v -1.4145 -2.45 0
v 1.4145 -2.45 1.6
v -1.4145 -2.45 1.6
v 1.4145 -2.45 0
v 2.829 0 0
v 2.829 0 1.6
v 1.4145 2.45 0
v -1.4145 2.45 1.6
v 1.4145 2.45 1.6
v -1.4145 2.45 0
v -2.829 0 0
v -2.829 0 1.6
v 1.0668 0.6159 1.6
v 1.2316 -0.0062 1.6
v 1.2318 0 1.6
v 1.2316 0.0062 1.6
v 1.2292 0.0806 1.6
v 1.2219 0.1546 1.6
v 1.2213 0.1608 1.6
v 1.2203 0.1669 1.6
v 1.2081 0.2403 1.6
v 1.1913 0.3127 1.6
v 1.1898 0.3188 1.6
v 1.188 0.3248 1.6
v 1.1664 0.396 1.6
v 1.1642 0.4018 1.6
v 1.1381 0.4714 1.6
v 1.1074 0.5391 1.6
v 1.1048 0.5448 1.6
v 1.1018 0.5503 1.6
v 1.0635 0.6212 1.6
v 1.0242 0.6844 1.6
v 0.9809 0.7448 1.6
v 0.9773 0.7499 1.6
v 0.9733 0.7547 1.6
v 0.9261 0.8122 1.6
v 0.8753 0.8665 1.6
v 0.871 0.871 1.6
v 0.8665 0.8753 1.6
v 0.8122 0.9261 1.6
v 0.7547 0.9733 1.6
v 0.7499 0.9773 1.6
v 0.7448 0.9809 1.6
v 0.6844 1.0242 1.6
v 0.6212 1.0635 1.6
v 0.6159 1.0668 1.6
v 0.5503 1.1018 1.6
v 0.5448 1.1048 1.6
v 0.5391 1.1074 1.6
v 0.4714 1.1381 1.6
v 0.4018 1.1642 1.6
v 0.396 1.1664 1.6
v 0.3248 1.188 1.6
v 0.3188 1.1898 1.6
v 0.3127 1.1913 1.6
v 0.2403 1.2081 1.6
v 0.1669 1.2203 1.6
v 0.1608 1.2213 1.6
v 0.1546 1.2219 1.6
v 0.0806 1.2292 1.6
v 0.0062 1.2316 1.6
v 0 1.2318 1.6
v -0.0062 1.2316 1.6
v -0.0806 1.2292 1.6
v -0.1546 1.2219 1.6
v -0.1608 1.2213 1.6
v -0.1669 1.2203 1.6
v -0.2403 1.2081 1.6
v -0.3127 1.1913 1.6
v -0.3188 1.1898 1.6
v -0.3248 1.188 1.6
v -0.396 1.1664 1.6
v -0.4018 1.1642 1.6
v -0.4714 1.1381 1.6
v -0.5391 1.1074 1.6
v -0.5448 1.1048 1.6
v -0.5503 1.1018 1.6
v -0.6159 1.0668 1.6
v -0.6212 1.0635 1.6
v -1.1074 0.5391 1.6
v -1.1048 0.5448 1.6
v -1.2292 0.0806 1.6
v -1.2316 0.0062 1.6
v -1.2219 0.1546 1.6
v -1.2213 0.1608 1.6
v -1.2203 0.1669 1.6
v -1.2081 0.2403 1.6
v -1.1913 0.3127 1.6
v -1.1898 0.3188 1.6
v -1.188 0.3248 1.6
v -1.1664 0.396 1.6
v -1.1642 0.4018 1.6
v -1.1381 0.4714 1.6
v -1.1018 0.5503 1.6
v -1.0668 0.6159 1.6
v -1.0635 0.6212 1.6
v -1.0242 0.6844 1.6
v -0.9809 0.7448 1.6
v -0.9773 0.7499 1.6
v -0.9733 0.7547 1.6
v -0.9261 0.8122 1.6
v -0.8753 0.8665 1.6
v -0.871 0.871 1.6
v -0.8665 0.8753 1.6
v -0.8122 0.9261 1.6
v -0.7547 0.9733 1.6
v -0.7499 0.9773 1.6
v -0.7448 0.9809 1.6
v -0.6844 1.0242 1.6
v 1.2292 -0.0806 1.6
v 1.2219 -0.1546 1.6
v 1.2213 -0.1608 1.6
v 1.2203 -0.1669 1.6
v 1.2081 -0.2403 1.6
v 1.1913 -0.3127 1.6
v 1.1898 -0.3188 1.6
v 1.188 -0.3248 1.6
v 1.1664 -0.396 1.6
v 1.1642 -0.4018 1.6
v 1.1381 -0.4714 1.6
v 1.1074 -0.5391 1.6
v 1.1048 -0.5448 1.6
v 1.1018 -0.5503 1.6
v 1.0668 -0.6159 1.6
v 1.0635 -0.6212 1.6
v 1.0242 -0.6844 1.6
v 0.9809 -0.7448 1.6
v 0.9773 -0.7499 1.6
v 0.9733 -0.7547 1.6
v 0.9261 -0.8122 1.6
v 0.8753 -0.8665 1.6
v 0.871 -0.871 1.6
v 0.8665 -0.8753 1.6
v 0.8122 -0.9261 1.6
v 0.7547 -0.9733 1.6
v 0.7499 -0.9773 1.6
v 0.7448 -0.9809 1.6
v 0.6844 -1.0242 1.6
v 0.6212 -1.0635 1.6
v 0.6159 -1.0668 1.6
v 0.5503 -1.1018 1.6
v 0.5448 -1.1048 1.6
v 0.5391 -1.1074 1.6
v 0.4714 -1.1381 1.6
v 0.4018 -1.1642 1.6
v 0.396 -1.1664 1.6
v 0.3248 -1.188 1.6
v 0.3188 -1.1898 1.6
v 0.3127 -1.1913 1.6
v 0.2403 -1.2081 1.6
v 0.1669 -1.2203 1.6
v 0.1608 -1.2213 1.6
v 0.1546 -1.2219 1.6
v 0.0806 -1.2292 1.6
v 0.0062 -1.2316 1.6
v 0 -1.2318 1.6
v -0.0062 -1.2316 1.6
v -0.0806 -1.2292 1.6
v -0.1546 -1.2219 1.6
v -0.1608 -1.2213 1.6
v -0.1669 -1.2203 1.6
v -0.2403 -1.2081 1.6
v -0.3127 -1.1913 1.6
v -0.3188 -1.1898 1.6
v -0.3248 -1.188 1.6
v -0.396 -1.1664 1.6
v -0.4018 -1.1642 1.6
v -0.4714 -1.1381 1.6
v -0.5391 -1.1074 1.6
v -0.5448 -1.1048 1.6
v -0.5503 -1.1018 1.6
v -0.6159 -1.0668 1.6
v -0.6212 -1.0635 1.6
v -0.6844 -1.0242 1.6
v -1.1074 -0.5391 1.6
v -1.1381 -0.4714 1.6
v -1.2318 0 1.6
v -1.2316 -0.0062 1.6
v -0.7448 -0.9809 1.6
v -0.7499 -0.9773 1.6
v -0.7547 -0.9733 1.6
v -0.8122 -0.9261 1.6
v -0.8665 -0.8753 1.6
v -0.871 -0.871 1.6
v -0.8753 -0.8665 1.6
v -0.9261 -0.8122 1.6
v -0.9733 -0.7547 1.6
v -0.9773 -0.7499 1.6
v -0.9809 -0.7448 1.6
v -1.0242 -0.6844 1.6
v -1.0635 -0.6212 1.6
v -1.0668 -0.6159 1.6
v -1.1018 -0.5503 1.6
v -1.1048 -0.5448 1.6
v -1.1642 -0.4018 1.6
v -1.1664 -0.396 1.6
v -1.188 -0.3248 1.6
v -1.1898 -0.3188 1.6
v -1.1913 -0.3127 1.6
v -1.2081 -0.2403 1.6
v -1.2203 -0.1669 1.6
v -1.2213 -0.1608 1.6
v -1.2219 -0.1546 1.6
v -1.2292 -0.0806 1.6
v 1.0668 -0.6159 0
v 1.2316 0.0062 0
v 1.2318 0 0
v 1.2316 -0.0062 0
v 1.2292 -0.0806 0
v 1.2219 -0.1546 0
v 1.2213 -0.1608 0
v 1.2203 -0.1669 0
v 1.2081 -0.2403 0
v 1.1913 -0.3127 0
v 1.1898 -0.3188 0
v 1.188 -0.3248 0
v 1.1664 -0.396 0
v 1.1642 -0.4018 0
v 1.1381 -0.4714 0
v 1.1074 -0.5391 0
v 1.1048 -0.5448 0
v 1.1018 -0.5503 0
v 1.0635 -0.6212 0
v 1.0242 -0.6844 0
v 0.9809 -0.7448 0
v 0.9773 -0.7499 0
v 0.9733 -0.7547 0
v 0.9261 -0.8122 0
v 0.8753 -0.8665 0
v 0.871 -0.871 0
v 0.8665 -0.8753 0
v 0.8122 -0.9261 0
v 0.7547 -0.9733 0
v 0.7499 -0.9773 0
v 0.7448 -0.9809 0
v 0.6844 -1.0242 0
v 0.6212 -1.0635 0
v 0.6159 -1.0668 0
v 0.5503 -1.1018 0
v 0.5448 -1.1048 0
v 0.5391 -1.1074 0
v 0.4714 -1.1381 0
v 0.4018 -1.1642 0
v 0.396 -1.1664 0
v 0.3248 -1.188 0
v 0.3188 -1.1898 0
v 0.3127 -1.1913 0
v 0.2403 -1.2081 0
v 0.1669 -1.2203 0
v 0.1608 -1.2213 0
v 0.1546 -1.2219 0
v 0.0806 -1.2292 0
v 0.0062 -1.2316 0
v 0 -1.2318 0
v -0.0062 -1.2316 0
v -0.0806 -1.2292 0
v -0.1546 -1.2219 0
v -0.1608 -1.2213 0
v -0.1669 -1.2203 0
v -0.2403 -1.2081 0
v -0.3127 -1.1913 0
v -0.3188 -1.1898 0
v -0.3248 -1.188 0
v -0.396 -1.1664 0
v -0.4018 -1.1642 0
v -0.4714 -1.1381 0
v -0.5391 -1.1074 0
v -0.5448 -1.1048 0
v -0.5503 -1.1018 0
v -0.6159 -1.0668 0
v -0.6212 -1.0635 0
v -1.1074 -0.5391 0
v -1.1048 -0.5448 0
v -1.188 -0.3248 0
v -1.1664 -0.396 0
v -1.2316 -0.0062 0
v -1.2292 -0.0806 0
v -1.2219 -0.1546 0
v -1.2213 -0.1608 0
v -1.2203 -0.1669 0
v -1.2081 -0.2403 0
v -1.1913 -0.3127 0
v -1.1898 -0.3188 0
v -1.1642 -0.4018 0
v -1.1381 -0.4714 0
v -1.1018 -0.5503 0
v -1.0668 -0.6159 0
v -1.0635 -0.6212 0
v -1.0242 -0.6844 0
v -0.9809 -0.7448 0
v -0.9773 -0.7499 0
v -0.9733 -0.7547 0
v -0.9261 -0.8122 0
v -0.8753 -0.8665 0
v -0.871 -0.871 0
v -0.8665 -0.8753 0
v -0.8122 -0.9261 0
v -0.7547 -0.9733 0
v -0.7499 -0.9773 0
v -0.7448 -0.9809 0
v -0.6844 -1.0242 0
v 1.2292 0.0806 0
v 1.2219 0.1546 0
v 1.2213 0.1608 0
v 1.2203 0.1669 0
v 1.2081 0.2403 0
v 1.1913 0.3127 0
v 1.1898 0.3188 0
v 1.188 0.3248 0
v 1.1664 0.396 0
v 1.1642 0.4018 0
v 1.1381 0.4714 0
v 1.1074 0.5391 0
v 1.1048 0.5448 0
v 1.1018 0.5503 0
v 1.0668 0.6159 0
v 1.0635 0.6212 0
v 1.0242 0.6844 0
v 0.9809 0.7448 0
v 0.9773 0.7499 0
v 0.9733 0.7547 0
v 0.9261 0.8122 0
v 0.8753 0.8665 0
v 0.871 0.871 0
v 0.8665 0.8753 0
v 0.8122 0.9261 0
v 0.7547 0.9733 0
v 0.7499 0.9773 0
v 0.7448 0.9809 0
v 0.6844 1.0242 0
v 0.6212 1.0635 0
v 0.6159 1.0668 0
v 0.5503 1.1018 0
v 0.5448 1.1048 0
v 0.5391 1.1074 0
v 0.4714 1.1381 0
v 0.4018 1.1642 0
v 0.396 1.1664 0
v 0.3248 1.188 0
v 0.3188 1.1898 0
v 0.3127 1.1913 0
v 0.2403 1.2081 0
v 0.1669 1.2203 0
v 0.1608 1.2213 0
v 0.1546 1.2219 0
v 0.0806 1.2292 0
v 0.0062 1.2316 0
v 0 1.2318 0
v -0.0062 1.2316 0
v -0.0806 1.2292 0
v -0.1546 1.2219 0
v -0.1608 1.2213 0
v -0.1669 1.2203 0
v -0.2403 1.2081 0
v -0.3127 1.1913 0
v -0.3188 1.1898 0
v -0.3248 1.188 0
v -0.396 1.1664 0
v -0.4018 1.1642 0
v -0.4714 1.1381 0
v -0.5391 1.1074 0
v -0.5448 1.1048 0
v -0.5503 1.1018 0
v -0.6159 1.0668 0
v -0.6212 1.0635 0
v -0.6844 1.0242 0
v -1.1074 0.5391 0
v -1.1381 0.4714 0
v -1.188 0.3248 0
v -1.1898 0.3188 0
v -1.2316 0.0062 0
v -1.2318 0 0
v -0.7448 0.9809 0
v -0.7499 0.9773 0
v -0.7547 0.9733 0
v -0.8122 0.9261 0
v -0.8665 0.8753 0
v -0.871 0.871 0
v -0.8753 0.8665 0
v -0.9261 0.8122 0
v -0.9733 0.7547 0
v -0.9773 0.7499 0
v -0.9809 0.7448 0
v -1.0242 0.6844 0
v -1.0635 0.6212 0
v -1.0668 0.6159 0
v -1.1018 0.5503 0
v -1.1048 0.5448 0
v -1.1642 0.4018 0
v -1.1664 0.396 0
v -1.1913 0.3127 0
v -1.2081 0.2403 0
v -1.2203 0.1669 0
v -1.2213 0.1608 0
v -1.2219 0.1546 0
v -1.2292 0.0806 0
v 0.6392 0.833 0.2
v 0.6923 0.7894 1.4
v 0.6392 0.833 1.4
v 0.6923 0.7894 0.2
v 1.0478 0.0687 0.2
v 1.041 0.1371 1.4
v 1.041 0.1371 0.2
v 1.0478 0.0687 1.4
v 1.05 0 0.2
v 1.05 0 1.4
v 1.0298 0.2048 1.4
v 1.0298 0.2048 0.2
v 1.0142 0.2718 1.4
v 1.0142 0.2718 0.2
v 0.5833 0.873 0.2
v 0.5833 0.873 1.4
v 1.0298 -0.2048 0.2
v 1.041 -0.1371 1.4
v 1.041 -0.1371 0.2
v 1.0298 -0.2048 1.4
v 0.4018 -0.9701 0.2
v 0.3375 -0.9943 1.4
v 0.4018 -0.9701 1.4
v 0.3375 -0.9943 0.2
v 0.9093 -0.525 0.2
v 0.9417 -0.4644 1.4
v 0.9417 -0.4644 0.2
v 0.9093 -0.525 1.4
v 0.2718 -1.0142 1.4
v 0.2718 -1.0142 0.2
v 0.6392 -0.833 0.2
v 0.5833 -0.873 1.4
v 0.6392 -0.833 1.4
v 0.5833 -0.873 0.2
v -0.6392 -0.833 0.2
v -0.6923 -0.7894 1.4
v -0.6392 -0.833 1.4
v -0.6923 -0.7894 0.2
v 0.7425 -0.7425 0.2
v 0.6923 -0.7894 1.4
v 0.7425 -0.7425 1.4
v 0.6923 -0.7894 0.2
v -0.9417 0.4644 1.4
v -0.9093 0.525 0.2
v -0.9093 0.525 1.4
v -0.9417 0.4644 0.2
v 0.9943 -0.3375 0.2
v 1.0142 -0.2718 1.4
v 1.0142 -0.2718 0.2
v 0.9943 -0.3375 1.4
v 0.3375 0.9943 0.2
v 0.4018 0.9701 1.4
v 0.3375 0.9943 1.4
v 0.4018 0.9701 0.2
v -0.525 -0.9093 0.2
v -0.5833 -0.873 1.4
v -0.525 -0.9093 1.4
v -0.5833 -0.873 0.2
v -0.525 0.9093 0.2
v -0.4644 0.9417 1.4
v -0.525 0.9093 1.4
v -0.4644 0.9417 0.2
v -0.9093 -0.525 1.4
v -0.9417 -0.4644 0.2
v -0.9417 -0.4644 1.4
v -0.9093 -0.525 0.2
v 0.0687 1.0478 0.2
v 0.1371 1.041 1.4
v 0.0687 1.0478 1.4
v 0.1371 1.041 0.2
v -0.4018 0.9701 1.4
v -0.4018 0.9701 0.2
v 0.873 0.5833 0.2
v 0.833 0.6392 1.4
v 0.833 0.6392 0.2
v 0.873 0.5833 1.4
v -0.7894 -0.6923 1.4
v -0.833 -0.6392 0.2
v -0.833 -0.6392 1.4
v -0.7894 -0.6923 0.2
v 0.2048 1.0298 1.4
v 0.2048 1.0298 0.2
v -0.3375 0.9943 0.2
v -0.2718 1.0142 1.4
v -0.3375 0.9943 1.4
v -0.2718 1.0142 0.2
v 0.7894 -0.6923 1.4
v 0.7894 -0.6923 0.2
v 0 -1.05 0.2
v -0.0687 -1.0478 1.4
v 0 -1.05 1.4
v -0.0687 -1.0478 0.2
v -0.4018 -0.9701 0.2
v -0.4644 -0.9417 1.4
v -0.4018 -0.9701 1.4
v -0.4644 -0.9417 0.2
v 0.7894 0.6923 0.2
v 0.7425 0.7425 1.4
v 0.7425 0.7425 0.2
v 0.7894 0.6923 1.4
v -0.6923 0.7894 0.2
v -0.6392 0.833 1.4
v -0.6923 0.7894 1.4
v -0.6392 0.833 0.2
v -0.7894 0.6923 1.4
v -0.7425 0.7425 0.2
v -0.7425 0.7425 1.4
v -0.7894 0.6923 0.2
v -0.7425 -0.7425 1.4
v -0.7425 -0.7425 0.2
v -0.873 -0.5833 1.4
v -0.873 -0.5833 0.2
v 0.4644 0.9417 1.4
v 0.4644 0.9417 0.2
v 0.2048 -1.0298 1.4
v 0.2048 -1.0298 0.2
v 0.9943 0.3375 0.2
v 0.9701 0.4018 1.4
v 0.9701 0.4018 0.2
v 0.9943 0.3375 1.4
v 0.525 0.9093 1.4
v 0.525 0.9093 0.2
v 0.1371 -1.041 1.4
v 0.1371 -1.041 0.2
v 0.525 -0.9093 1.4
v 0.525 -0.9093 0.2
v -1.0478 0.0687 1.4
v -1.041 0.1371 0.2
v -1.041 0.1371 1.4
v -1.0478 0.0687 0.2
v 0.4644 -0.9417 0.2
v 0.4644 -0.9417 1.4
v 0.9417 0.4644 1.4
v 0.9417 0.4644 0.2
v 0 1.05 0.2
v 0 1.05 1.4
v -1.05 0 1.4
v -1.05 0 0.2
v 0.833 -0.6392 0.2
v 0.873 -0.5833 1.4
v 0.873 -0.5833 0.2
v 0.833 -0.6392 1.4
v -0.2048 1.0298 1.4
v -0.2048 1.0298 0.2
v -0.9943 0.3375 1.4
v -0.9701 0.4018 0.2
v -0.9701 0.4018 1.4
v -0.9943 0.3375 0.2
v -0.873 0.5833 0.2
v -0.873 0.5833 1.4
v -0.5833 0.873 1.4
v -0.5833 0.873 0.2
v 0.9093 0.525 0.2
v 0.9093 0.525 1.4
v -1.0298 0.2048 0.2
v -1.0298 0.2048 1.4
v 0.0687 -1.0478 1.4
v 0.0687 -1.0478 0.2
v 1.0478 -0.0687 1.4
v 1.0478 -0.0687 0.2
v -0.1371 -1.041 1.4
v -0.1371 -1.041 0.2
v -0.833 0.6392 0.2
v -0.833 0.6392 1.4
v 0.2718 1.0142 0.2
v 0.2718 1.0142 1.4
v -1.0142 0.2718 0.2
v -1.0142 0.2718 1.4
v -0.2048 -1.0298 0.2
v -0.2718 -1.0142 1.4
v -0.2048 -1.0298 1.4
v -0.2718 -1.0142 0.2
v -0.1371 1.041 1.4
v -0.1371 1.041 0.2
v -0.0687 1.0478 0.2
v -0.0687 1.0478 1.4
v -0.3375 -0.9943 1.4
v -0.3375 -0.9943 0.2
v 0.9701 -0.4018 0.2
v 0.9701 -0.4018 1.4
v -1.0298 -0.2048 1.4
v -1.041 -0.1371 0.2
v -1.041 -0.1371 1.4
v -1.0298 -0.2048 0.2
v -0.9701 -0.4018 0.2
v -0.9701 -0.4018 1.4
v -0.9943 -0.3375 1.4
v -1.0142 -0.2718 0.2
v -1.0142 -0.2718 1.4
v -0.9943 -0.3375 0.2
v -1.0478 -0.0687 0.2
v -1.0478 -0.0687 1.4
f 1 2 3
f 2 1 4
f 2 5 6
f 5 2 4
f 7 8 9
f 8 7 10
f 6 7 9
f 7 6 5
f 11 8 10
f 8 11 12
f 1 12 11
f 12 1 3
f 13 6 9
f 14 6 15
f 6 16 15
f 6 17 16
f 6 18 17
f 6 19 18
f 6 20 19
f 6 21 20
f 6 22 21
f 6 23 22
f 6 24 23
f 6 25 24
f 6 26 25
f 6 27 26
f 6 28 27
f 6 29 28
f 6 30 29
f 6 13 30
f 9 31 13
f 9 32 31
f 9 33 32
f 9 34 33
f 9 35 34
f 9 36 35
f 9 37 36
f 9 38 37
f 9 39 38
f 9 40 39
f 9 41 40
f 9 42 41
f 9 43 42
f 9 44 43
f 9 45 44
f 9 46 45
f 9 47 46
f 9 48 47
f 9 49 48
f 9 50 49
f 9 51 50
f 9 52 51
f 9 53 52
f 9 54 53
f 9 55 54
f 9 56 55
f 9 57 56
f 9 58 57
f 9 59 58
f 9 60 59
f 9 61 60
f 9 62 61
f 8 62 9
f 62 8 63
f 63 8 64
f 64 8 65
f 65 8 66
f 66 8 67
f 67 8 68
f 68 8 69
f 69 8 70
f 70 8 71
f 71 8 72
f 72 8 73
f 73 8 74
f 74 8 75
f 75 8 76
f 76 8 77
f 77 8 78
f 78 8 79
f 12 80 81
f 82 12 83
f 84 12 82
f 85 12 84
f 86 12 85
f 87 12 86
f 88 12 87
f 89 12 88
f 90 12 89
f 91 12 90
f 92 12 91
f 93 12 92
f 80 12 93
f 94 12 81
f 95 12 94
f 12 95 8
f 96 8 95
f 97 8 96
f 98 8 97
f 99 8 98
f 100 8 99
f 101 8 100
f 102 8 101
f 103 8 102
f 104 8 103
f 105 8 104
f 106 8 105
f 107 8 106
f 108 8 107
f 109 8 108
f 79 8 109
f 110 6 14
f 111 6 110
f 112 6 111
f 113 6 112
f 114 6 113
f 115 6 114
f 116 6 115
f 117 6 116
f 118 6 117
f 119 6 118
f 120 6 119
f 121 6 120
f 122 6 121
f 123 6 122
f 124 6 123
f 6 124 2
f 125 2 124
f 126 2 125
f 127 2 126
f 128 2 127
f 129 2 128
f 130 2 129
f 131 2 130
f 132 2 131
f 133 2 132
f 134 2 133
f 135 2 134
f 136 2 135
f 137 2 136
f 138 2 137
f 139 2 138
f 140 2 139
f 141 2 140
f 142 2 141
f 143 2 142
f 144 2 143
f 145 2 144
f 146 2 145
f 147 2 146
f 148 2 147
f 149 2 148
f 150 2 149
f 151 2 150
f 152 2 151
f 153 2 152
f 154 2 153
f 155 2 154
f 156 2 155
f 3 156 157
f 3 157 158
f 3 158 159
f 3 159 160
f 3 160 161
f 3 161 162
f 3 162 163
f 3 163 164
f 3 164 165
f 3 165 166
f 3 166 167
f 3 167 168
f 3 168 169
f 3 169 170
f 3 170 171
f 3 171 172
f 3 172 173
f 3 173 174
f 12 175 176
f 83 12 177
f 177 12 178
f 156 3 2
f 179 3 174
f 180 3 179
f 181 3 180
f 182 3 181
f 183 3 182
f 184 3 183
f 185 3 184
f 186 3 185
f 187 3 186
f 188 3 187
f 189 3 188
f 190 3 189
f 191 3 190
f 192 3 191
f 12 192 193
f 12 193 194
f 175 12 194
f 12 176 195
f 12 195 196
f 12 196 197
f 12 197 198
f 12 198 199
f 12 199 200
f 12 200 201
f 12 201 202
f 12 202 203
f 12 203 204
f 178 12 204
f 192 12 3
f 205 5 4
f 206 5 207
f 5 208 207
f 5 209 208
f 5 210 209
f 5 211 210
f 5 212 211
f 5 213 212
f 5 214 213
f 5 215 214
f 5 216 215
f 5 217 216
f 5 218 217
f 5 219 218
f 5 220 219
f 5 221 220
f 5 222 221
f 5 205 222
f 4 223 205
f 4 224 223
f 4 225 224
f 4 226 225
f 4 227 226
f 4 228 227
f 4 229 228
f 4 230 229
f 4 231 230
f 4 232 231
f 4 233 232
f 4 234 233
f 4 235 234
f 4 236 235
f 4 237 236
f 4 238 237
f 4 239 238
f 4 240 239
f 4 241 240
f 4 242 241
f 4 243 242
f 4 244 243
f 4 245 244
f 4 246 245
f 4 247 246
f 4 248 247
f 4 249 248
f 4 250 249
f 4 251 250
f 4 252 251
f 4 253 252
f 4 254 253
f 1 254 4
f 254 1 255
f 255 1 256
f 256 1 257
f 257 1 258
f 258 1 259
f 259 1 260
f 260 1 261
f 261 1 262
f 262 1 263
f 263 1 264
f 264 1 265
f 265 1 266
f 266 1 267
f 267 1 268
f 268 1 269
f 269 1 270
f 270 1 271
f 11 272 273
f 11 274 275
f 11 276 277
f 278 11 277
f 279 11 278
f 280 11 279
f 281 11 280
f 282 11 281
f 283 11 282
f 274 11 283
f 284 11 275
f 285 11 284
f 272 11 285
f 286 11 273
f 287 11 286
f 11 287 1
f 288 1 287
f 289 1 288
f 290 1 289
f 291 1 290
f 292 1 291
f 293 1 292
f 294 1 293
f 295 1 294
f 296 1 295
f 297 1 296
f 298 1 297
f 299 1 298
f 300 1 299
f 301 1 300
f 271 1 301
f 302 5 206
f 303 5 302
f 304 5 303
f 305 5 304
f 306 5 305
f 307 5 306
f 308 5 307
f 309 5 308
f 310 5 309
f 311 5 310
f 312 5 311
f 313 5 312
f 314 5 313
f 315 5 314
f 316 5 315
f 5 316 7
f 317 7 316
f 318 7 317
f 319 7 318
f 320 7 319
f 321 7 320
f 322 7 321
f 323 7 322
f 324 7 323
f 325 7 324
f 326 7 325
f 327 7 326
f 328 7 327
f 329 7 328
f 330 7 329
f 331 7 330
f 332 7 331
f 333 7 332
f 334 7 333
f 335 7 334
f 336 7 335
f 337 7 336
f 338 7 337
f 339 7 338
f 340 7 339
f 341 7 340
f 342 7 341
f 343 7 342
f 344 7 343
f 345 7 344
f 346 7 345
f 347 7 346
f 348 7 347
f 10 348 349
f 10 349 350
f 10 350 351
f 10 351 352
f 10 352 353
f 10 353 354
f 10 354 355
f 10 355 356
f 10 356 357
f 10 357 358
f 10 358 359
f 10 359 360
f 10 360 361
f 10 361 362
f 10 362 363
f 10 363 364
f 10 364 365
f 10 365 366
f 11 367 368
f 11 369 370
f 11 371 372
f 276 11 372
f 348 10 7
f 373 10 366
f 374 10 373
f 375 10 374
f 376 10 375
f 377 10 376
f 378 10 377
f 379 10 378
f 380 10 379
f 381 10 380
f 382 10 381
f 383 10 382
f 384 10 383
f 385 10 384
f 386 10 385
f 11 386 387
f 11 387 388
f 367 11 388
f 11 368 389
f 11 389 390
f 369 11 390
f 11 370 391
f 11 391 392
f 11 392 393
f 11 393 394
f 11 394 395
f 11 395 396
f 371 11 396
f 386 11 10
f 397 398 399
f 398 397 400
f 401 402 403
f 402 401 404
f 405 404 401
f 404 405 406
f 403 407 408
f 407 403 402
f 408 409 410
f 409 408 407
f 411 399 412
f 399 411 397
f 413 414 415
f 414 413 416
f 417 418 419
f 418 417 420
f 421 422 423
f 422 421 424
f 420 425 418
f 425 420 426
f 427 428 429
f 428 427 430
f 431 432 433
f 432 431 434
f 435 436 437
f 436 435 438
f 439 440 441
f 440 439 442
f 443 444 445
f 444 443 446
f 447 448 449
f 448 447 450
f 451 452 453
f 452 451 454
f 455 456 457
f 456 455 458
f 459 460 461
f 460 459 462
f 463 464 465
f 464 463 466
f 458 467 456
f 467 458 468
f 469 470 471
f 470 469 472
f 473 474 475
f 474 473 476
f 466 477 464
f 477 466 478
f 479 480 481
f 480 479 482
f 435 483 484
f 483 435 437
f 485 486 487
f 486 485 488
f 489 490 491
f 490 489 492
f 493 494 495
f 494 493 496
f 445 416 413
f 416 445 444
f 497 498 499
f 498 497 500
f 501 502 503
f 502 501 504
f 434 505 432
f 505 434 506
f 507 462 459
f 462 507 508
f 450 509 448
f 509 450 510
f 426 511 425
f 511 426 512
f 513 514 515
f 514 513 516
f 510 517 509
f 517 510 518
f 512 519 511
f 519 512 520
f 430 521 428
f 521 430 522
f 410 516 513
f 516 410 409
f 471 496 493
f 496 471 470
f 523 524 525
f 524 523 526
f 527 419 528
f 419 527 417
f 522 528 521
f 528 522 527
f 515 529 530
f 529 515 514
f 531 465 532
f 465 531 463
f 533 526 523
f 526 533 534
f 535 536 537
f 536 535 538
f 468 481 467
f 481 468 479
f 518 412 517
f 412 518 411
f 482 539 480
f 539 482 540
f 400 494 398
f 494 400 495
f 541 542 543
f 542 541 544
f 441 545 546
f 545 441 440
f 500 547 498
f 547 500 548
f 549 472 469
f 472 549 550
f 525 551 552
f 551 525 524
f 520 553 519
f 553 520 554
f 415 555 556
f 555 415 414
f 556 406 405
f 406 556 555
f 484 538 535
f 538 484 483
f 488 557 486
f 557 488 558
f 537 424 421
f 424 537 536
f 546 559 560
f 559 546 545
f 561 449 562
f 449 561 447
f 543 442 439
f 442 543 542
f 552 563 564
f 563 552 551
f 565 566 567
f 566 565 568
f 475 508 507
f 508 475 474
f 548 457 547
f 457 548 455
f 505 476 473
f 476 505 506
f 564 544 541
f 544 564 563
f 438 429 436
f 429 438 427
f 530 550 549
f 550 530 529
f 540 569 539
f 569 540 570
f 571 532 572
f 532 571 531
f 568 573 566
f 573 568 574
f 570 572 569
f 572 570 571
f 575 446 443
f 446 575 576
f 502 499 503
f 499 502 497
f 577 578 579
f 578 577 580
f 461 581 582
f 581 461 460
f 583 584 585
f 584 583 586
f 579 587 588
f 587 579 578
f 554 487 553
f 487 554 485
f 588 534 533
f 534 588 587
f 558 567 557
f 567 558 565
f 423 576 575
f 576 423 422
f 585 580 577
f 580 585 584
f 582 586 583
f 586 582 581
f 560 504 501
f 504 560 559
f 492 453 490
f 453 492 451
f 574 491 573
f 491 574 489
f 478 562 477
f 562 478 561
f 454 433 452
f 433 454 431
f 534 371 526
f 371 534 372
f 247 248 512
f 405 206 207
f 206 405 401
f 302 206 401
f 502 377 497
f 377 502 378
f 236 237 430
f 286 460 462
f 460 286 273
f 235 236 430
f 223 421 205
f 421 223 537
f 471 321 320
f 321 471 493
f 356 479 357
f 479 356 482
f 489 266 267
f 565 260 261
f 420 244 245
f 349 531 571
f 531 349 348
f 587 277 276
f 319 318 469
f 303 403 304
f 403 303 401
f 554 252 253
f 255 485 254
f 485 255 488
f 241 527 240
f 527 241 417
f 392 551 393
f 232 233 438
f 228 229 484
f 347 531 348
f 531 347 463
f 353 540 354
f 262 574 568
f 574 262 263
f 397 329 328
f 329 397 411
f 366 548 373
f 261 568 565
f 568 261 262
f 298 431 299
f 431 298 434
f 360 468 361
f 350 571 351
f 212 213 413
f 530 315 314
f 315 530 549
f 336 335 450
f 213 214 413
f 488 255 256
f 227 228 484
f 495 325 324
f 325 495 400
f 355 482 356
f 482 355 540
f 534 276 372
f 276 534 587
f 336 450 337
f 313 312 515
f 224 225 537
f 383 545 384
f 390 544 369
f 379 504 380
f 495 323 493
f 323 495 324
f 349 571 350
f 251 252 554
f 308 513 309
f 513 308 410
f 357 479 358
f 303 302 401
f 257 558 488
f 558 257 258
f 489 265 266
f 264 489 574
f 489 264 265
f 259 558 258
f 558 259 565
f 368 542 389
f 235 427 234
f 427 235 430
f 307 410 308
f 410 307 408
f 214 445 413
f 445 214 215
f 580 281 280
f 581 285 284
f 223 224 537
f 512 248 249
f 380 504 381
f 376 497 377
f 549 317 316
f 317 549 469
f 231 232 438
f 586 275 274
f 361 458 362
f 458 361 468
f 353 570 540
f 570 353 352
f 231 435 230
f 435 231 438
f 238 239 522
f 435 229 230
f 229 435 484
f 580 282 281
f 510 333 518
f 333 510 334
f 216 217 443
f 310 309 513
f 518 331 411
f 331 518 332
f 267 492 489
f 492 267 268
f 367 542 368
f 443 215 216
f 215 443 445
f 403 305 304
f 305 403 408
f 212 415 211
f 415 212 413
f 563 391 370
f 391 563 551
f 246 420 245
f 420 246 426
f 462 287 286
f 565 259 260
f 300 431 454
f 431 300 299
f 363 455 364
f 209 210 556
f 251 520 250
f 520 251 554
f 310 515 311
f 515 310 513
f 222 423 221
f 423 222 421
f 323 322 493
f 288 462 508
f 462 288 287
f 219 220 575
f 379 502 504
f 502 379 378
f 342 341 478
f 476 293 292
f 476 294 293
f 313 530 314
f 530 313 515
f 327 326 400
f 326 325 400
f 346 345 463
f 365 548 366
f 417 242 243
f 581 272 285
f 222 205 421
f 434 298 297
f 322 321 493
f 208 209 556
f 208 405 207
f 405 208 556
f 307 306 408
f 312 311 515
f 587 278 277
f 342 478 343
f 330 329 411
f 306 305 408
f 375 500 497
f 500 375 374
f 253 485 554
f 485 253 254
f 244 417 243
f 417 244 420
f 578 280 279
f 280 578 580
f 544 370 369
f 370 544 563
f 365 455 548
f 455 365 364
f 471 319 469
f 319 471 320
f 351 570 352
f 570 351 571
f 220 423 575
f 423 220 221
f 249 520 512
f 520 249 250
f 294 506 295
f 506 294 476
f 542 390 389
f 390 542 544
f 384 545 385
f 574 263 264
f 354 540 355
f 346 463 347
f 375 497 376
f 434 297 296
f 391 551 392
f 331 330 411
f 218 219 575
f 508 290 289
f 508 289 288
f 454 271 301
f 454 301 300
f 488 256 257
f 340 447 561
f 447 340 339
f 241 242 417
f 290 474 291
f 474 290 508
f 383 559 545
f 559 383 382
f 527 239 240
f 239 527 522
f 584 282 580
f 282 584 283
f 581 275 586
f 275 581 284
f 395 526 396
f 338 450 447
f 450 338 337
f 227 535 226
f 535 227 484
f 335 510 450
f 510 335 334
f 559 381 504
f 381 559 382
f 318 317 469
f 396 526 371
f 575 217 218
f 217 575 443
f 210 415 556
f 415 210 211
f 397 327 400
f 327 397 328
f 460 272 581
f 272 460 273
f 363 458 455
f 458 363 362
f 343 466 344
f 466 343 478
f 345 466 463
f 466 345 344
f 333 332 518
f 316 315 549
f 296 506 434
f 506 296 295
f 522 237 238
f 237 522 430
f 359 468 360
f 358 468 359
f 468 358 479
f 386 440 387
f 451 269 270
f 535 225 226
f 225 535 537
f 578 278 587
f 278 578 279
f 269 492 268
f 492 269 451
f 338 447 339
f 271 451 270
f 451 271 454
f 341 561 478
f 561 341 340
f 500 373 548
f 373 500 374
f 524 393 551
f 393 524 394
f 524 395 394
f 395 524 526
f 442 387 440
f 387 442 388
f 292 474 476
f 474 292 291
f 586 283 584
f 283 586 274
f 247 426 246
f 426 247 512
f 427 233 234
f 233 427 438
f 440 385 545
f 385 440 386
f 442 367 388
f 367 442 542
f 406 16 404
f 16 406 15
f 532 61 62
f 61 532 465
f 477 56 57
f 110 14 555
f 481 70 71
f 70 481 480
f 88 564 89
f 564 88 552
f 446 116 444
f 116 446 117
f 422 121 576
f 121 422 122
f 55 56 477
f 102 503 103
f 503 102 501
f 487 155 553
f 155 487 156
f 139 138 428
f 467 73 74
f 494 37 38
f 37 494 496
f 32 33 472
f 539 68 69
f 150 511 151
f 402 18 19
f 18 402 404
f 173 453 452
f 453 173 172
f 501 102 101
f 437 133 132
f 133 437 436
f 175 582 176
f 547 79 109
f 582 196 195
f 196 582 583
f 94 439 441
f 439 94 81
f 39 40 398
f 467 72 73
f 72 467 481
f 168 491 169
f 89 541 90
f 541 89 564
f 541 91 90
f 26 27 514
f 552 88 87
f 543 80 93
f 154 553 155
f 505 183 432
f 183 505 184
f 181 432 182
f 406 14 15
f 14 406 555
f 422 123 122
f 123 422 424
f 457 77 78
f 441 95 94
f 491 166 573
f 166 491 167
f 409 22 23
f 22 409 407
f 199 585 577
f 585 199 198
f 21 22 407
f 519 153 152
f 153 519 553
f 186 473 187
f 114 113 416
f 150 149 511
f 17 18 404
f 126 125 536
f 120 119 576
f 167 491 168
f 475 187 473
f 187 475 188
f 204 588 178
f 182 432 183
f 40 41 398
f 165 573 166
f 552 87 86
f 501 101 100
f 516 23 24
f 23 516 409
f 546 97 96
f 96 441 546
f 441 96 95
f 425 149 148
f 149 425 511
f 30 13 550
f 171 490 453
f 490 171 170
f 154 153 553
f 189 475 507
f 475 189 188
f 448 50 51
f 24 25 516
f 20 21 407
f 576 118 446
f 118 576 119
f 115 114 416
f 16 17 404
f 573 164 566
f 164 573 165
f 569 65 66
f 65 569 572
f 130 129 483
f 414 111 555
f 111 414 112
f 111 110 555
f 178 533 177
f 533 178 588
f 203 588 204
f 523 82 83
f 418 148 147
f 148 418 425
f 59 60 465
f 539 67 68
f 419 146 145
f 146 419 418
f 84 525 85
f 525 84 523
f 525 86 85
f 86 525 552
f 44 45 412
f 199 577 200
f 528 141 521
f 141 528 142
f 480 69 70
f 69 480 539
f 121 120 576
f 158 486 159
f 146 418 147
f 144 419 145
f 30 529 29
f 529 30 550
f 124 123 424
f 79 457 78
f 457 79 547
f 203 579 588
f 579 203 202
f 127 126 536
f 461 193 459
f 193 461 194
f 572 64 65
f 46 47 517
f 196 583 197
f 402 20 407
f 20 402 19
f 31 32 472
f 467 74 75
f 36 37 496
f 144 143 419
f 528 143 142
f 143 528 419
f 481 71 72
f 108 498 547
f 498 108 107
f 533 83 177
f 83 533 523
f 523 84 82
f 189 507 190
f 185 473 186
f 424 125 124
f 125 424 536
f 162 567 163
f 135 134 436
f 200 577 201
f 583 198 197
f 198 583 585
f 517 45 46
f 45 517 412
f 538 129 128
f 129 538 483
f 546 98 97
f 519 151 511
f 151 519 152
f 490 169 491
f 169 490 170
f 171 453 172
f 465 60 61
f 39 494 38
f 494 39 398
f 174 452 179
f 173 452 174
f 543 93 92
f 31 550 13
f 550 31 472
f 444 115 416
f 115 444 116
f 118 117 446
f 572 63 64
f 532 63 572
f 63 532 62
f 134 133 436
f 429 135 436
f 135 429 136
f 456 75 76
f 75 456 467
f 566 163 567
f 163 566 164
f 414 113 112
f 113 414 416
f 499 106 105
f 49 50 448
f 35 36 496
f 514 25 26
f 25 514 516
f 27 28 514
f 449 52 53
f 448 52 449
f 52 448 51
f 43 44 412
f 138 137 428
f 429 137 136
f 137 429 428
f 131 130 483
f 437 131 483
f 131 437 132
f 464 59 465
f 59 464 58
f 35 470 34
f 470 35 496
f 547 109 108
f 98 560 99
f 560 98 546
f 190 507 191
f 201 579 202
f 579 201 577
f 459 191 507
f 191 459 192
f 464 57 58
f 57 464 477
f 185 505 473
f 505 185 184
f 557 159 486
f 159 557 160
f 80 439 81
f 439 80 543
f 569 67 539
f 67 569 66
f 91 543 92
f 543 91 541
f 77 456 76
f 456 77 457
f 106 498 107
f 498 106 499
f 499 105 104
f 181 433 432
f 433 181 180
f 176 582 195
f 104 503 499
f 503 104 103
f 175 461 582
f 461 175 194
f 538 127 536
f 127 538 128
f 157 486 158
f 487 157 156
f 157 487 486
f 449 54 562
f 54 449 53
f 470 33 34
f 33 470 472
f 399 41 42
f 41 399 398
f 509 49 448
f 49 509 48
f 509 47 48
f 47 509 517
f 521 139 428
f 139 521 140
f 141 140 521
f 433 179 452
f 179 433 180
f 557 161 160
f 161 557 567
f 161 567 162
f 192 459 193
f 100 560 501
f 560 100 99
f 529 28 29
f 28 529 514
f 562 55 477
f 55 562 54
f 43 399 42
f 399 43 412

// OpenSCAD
// Hex nut for M2 (2.0mm) screw
// Target: 4.9mm across flats, 1.6mm thick
// One connected solid (washer disabled by default)

$fn = 96;

// Parameters
thread_diameter_mm = 2.0;      // M2 major diameter (used for clearance hole unless threaded modeling is added)
across_flats_mm    = 4.9;      // across flats
thickness_mm       = 1.6;      // nut thickness
tolerance_mm       = 0.10;     // clearance on hole diameter
chamfer_mm         = 0.20;     // lead-in chamfer height
eps_mm             = 0.02;     // small epsilon for robust booleans

washer_enabled     = 0;        // keep off to ensure single connected solid by default
washer_outer_d_mm  = 5.5;
washer_thickness_mm= 0.5;

// Derived
hex_R = across_flats_mm / (2 * cos(30));                 // circumradius for $fn=6 cylinder
hole_r = (thread_diameter_mm + tolerance_mm) / 2;

module hex_nut() {
    difference() {
        // Body (not centered to avoid accidental "blank" from view/clipping issues)
        cylinder(h = thickness_mm, r = hex_R, $fn = 6, center = false);

        // Through hole
        translate([0, 0, -eps_mm])
            cylinder(h = thickness_mm + 2*eps_mm, r = hole_r, center = false);

        // Lead-in chamfers (top and bottom)
        // Bottom chamfer
        translate([0, 0, -eps_mm])
            cylinder(h = chamfer_mm + eps_mm,
                     r1 = hole_r + chamfer_mm,
                     r2 = hole_r,
                     center = false);

        // Top chamfer
        translate([0, 0, thickness_mm - chamfer_mm])
            cylinder(h = chamfer_mm + eps_mm,
                     r1 = hole_r,
                     r2 = hole_r + chamfer_mm,
                     center = false);
    }
}

module washer_connected() {
    // If enabled, fuse washer to nut with a tiny overlap so the result is ONE connected solid.
    if (washer_enabled) {
        overlap = 0.05;
        translate([0, 0, -(washer_thickness_mm - overlap)])
        difference() {
            cylinder(h = washer_thickness_mm, r = washer_outer_d_mm/2, center = false);
            translate([0, 0, -eps_mm])
                cylinder(h = washer_thickness_mm + 2*eps_mm, r = hole_r, center = false);
        }
    }
}

union() {
    hex_nut();
    washer_connected();
}
